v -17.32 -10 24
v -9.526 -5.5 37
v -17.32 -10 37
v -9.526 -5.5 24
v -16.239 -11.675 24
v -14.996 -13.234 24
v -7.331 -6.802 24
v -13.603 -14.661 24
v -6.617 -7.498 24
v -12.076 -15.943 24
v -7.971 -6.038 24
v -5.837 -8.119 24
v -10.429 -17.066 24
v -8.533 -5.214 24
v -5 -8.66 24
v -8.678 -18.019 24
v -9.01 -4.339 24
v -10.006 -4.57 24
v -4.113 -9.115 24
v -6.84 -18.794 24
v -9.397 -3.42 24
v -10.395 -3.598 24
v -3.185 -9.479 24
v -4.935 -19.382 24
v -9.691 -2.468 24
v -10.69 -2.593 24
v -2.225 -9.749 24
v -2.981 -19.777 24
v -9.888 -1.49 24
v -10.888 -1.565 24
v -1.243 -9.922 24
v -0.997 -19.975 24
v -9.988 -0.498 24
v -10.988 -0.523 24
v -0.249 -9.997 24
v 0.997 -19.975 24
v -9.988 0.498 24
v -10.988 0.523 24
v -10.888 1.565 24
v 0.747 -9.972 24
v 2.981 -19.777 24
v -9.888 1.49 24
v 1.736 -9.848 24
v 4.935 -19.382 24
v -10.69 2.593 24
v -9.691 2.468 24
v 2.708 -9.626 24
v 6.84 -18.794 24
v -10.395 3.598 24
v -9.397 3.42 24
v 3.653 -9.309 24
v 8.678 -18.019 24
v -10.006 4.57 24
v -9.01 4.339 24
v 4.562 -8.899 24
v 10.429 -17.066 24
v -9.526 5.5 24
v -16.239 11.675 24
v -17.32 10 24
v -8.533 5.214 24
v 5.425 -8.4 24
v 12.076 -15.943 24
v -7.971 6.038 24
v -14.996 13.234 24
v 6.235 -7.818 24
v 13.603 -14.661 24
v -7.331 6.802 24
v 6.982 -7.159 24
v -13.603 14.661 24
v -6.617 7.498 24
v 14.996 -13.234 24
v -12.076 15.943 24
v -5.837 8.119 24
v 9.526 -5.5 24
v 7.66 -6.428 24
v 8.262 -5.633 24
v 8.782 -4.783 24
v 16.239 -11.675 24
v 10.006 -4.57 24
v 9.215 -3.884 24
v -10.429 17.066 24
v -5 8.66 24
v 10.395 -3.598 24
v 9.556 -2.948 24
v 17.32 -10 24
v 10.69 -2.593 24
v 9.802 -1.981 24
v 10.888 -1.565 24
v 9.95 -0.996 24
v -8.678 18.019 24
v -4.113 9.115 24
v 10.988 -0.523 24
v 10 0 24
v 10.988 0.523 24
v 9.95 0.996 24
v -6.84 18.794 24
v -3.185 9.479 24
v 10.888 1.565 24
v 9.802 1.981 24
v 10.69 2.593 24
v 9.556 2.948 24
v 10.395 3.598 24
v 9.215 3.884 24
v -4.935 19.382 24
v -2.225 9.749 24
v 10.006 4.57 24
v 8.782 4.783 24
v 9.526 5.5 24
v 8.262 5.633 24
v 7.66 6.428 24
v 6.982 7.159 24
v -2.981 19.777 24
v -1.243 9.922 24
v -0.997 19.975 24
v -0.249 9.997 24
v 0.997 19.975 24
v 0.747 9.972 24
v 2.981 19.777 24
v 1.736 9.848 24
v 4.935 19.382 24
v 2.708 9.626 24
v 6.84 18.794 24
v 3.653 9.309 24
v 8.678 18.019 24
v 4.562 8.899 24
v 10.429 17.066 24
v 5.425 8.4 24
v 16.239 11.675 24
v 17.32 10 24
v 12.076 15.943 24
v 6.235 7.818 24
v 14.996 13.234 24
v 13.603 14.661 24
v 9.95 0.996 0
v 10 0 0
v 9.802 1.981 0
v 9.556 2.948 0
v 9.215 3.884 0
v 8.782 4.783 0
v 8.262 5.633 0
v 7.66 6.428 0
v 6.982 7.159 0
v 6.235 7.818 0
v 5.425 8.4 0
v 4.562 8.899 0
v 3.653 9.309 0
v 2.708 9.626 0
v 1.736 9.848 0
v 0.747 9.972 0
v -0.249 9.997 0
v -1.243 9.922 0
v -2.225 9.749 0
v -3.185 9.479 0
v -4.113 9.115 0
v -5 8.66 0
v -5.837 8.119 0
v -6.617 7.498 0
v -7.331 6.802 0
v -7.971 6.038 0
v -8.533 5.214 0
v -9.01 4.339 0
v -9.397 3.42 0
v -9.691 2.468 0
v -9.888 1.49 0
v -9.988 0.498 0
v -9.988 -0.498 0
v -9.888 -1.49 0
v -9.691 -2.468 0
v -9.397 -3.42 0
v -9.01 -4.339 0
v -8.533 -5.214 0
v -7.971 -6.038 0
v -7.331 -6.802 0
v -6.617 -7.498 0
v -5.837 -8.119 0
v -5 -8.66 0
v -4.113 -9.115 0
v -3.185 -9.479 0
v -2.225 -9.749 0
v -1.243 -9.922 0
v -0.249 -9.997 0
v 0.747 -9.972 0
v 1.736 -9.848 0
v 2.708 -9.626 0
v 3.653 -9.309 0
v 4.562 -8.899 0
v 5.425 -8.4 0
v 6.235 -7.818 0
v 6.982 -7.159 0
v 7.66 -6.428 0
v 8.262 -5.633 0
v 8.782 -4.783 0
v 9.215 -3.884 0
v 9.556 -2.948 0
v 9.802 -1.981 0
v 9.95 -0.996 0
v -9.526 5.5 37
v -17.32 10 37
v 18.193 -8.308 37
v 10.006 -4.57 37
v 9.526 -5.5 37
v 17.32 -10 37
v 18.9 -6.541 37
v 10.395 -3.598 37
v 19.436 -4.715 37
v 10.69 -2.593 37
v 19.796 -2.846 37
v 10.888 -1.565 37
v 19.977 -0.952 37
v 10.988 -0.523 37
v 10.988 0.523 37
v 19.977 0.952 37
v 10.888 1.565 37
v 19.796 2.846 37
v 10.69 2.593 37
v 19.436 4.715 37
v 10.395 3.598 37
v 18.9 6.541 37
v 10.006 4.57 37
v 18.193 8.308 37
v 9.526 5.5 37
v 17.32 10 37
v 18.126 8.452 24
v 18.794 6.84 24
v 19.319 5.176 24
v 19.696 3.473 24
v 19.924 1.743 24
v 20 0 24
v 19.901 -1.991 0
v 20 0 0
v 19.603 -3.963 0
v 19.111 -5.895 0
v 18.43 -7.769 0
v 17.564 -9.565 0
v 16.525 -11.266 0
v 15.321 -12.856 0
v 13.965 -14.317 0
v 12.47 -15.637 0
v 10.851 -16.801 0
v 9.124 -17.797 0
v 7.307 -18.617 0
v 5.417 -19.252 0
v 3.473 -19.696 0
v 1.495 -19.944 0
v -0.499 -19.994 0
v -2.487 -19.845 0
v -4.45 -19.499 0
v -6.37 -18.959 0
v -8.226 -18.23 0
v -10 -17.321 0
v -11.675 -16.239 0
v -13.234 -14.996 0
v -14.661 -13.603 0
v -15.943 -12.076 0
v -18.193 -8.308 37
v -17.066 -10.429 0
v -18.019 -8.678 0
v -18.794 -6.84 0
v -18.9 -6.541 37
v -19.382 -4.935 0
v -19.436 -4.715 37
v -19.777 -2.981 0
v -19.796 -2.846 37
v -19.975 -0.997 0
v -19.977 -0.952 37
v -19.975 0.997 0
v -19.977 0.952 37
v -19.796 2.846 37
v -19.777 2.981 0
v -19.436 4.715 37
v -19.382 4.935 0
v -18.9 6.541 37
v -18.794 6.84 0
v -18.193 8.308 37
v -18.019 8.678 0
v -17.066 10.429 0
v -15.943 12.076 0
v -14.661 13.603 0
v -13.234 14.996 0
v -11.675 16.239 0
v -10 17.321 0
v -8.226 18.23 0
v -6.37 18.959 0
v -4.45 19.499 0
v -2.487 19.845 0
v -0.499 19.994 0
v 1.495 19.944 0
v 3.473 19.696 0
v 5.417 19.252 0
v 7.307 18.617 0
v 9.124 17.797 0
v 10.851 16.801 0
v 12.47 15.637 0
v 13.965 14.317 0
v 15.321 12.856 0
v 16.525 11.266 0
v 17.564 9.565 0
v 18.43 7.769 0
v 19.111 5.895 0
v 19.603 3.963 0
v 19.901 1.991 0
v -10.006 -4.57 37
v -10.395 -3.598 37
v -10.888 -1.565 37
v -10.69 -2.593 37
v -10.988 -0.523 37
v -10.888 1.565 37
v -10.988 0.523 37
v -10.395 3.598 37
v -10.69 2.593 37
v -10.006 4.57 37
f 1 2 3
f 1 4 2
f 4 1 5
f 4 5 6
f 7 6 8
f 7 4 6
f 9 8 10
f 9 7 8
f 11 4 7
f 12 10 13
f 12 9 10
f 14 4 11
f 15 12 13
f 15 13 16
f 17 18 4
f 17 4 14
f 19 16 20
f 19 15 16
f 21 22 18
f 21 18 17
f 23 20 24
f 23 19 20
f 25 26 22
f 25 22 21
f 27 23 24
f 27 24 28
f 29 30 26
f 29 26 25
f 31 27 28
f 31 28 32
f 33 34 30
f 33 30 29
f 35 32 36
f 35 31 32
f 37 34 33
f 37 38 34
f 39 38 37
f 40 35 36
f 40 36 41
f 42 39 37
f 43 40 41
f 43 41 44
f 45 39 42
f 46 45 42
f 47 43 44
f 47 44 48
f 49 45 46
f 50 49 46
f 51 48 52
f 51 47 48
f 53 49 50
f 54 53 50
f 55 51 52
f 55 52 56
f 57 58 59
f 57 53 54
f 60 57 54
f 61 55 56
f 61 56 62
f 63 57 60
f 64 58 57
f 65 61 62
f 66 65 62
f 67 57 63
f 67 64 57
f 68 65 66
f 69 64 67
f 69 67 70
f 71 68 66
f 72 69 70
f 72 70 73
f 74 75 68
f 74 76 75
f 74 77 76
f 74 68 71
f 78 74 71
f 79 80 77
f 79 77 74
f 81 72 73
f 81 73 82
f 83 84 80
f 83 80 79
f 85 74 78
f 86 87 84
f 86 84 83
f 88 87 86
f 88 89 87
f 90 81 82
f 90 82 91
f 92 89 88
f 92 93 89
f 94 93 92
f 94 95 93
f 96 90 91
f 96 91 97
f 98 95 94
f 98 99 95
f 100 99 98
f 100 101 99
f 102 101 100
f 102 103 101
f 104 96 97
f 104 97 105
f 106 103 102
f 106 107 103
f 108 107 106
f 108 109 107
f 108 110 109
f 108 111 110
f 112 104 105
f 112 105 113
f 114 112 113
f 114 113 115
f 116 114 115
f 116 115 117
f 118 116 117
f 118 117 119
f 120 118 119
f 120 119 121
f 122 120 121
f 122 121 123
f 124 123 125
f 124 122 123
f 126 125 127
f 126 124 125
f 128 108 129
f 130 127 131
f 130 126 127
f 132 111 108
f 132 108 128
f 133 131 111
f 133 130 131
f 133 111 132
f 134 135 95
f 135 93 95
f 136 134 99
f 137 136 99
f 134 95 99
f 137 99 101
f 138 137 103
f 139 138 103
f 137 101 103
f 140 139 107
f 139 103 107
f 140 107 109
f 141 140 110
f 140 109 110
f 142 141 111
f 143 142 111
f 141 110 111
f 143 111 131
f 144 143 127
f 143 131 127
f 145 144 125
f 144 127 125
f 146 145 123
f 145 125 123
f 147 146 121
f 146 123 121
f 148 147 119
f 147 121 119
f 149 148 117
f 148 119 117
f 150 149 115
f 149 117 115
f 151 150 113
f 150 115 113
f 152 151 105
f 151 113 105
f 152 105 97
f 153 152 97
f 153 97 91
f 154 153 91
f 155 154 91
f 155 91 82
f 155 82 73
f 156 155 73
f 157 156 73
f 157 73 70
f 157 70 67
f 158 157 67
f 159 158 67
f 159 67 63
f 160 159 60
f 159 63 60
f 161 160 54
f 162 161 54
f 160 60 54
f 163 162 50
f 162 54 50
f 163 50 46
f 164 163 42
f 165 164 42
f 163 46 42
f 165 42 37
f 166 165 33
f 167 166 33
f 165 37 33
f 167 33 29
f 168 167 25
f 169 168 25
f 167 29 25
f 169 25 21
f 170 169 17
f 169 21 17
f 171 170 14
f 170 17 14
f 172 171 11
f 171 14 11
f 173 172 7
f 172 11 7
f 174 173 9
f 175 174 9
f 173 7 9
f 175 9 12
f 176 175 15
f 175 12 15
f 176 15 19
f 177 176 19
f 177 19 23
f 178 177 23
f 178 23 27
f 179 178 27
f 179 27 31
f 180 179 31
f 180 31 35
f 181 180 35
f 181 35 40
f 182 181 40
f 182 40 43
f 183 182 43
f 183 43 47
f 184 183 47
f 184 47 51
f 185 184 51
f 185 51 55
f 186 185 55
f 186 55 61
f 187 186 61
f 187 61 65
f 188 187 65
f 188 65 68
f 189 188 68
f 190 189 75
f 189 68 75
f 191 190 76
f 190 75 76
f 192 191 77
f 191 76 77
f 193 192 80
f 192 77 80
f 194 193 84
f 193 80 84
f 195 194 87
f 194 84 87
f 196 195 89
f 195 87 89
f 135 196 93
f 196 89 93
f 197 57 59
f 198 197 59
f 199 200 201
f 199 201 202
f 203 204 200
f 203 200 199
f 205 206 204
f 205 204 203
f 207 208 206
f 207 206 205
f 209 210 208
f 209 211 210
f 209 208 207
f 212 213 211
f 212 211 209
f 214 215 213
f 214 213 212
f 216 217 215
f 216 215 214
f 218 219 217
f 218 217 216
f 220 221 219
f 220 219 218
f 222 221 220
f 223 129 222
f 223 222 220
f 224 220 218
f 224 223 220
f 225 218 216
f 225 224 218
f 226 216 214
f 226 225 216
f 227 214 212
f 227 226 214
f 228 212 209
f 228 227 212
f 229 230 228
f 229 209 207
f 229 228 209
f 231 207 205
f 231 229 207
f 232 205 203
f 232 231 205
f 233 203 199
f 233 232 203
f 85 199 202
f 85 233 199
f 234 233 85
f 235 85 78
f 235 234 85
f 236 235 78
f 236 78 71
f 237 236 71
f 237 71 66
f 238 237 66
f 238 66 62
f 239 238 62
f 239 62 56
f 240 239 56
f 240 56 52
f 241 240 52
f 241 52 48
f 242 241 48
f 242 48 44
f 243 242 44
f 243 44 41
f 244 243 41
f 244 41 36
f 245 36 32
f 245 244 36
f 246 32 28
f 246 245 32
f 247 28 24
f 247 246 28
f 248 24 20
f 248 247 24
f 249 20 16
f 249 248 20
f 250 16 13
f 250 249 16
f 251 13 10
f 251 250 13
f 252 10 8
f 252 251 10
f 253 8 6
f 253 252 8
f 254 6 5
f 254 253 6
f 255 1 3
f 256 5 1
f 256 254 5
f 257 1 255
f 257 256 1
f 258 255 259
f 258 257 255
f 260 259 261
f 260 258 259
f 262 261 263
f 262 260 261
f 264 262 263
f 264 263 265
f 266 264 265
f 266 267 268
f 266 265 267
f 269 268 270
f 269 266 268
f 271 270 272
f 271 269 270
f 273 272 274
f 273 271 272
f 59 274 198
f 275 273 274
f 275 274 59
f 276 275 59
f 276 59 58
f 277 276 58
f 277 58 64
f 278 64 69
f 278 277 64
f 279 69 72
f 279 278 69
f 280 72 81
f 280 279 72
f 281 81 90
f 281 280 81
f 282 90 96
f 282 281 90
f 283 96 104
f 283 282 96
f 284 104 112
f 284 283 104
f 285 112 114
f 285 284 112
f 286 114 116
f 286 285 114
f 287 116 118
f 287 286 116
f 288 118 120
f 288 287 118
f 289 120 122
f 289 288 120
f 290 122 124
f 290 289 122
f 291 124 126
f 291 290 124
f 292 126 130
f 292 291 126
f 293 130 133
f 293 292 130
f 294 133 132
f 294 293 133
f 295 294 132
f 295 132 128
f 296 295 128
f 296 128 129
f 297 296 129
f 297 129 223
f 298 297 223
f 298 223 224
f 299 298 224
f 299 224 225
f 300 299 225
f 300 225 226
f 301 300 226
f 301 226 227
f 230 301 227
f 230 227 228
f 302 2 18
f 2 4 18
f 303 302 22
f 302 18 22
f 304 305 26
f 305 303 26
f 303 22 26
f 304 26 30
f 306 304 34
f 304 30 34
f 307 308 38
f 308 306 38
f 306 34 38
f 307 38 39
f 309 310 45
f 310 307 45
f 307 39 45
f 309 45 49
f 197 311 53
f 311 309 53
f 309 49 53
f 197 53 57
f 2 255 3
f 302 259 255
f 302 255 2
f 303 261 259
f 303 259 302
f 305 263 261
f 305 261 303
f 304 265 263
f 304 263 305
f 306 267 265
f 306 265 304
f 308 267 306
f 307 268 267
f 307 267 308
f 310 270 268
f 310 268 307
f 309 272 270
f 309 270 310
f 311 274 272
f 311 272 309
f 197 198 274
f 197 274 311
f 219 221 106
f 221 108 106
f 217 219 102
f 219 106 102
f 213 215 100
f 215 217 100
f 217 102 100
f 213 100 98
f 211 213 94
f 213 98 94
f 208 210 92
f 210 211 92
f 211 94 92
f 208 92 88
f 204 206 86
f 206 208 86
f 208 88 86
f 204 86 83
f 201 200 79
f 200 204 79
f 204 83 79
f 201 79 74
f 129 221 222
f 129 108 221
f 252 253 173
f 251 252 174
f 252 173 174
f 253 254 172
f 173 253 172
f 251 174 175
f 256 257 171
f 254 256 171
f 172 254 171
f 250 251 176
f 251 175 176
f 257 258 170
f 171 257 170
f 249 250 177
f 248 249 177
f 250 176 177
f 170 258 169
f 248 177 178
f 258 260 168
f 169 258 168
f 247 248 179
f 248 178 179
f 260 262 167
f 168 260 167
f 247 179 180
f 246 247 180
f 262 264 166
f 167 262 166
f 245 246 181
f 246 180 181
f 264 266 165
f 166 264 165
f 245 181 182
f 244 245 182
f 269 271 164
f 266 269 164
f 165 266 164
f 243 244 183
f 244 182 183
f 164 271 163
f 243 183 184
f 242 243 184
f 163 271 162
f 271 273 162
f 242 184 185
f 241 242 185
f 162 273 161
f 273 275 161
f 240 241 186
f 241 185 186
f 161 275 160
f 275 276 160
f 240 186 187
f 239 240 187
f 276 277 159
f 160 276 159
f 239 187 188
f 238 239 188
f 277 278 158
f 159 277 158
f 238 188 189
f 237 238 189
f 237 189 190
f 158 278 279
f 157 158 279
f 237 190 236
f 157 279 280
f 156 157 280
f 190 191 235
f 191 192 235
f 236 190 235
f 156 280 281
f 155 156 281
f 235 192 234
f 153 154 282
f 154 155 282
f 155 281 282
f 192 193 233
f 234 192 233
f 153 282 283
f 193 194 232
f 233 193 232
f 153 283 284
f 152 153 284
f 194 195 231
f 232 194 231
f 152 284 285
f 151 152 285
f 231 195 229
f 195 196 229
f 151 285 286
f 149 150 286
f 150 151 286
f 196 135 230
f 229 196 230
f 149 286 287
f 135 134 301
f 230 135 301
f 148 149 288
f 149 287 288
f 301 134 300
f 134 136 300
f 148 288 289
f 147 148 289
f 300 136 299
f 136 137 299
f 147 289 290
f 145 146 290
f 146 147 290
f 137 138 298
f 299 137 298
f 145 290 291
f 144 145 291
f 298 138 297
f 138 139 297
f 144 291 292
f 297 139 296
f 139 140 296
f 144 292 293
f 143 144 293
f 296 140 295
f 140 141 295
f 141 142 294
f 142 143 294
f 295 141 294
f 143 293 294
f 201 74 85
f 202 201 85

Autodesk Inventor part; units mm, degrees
ref_plane "YZ Plane" through (0, 0, 0) normal (1, 0, 0) x (0, 1, 0)
ref_plane "XZ Plane" through (0, 0, 0) normal (0, 1, 0) x (-1, 0, 0)
ref_plane "XY Plane" through (0, 0, 0) normal (0, 0, 1) x (1, 0, 0)
sketch "Sketch1" plane through (0, 0, 0) normal (0, 0, 1) x (1, 0, 0)
  circle A0 centre (0, 0) radius 20
  dimension "d0" = 40
extrude "Extrusion1" add sketch "Sketch1" along normal blind 24
sketch "Sketch2" plane through (0, 0, 24) normal (0, 0, 1) x (1, 0, 0)
  arc A0 (-9.5263, 5.5) -> (-9.5263, -5.5) centre (0, 0) ccw
  line L0 (-9.5263, 5.5) -> (-17.3205, 10)
  circle A1 centre (0, 0) radius 20 projected
  line L1 (0, 0) -> (20, 0) construction
  line L2 (-9.5263, -5.5) -> (-17.3205, -10)
  line L3 (0, 0) -> (20, 0) construction
  line L4 (0, 0) -> (0, 20) construction
  arc A2 (9.5263, -5.5) -> (9.5263, 5.5) centre (0, 0) ccw
  line L5 (9.5263, 5.5) -> (17.3205, 10)
  line L6 (9.5263, -5.5) -> (17.3205, -10)
  dimension "d3" = 22
  dimension "d4" = 150
  dimension "d5" = 150
extrude "Extrusion2" add sketch "Sketch2" along normal blind 13 contours A0 L2 A1 L0 | A1 L6 A2 L5
sketch "Sketch3" plane through (0, 0, 24) normal (0, 0, 1) x (1, 0, 0)
  circle A0 centre (0, 0) radius 10
  dimension "d8" = 20
extrude "Extrusion3" cut sketch "Sketch3" against normal through all
properties part number "LOWER-JAW"
